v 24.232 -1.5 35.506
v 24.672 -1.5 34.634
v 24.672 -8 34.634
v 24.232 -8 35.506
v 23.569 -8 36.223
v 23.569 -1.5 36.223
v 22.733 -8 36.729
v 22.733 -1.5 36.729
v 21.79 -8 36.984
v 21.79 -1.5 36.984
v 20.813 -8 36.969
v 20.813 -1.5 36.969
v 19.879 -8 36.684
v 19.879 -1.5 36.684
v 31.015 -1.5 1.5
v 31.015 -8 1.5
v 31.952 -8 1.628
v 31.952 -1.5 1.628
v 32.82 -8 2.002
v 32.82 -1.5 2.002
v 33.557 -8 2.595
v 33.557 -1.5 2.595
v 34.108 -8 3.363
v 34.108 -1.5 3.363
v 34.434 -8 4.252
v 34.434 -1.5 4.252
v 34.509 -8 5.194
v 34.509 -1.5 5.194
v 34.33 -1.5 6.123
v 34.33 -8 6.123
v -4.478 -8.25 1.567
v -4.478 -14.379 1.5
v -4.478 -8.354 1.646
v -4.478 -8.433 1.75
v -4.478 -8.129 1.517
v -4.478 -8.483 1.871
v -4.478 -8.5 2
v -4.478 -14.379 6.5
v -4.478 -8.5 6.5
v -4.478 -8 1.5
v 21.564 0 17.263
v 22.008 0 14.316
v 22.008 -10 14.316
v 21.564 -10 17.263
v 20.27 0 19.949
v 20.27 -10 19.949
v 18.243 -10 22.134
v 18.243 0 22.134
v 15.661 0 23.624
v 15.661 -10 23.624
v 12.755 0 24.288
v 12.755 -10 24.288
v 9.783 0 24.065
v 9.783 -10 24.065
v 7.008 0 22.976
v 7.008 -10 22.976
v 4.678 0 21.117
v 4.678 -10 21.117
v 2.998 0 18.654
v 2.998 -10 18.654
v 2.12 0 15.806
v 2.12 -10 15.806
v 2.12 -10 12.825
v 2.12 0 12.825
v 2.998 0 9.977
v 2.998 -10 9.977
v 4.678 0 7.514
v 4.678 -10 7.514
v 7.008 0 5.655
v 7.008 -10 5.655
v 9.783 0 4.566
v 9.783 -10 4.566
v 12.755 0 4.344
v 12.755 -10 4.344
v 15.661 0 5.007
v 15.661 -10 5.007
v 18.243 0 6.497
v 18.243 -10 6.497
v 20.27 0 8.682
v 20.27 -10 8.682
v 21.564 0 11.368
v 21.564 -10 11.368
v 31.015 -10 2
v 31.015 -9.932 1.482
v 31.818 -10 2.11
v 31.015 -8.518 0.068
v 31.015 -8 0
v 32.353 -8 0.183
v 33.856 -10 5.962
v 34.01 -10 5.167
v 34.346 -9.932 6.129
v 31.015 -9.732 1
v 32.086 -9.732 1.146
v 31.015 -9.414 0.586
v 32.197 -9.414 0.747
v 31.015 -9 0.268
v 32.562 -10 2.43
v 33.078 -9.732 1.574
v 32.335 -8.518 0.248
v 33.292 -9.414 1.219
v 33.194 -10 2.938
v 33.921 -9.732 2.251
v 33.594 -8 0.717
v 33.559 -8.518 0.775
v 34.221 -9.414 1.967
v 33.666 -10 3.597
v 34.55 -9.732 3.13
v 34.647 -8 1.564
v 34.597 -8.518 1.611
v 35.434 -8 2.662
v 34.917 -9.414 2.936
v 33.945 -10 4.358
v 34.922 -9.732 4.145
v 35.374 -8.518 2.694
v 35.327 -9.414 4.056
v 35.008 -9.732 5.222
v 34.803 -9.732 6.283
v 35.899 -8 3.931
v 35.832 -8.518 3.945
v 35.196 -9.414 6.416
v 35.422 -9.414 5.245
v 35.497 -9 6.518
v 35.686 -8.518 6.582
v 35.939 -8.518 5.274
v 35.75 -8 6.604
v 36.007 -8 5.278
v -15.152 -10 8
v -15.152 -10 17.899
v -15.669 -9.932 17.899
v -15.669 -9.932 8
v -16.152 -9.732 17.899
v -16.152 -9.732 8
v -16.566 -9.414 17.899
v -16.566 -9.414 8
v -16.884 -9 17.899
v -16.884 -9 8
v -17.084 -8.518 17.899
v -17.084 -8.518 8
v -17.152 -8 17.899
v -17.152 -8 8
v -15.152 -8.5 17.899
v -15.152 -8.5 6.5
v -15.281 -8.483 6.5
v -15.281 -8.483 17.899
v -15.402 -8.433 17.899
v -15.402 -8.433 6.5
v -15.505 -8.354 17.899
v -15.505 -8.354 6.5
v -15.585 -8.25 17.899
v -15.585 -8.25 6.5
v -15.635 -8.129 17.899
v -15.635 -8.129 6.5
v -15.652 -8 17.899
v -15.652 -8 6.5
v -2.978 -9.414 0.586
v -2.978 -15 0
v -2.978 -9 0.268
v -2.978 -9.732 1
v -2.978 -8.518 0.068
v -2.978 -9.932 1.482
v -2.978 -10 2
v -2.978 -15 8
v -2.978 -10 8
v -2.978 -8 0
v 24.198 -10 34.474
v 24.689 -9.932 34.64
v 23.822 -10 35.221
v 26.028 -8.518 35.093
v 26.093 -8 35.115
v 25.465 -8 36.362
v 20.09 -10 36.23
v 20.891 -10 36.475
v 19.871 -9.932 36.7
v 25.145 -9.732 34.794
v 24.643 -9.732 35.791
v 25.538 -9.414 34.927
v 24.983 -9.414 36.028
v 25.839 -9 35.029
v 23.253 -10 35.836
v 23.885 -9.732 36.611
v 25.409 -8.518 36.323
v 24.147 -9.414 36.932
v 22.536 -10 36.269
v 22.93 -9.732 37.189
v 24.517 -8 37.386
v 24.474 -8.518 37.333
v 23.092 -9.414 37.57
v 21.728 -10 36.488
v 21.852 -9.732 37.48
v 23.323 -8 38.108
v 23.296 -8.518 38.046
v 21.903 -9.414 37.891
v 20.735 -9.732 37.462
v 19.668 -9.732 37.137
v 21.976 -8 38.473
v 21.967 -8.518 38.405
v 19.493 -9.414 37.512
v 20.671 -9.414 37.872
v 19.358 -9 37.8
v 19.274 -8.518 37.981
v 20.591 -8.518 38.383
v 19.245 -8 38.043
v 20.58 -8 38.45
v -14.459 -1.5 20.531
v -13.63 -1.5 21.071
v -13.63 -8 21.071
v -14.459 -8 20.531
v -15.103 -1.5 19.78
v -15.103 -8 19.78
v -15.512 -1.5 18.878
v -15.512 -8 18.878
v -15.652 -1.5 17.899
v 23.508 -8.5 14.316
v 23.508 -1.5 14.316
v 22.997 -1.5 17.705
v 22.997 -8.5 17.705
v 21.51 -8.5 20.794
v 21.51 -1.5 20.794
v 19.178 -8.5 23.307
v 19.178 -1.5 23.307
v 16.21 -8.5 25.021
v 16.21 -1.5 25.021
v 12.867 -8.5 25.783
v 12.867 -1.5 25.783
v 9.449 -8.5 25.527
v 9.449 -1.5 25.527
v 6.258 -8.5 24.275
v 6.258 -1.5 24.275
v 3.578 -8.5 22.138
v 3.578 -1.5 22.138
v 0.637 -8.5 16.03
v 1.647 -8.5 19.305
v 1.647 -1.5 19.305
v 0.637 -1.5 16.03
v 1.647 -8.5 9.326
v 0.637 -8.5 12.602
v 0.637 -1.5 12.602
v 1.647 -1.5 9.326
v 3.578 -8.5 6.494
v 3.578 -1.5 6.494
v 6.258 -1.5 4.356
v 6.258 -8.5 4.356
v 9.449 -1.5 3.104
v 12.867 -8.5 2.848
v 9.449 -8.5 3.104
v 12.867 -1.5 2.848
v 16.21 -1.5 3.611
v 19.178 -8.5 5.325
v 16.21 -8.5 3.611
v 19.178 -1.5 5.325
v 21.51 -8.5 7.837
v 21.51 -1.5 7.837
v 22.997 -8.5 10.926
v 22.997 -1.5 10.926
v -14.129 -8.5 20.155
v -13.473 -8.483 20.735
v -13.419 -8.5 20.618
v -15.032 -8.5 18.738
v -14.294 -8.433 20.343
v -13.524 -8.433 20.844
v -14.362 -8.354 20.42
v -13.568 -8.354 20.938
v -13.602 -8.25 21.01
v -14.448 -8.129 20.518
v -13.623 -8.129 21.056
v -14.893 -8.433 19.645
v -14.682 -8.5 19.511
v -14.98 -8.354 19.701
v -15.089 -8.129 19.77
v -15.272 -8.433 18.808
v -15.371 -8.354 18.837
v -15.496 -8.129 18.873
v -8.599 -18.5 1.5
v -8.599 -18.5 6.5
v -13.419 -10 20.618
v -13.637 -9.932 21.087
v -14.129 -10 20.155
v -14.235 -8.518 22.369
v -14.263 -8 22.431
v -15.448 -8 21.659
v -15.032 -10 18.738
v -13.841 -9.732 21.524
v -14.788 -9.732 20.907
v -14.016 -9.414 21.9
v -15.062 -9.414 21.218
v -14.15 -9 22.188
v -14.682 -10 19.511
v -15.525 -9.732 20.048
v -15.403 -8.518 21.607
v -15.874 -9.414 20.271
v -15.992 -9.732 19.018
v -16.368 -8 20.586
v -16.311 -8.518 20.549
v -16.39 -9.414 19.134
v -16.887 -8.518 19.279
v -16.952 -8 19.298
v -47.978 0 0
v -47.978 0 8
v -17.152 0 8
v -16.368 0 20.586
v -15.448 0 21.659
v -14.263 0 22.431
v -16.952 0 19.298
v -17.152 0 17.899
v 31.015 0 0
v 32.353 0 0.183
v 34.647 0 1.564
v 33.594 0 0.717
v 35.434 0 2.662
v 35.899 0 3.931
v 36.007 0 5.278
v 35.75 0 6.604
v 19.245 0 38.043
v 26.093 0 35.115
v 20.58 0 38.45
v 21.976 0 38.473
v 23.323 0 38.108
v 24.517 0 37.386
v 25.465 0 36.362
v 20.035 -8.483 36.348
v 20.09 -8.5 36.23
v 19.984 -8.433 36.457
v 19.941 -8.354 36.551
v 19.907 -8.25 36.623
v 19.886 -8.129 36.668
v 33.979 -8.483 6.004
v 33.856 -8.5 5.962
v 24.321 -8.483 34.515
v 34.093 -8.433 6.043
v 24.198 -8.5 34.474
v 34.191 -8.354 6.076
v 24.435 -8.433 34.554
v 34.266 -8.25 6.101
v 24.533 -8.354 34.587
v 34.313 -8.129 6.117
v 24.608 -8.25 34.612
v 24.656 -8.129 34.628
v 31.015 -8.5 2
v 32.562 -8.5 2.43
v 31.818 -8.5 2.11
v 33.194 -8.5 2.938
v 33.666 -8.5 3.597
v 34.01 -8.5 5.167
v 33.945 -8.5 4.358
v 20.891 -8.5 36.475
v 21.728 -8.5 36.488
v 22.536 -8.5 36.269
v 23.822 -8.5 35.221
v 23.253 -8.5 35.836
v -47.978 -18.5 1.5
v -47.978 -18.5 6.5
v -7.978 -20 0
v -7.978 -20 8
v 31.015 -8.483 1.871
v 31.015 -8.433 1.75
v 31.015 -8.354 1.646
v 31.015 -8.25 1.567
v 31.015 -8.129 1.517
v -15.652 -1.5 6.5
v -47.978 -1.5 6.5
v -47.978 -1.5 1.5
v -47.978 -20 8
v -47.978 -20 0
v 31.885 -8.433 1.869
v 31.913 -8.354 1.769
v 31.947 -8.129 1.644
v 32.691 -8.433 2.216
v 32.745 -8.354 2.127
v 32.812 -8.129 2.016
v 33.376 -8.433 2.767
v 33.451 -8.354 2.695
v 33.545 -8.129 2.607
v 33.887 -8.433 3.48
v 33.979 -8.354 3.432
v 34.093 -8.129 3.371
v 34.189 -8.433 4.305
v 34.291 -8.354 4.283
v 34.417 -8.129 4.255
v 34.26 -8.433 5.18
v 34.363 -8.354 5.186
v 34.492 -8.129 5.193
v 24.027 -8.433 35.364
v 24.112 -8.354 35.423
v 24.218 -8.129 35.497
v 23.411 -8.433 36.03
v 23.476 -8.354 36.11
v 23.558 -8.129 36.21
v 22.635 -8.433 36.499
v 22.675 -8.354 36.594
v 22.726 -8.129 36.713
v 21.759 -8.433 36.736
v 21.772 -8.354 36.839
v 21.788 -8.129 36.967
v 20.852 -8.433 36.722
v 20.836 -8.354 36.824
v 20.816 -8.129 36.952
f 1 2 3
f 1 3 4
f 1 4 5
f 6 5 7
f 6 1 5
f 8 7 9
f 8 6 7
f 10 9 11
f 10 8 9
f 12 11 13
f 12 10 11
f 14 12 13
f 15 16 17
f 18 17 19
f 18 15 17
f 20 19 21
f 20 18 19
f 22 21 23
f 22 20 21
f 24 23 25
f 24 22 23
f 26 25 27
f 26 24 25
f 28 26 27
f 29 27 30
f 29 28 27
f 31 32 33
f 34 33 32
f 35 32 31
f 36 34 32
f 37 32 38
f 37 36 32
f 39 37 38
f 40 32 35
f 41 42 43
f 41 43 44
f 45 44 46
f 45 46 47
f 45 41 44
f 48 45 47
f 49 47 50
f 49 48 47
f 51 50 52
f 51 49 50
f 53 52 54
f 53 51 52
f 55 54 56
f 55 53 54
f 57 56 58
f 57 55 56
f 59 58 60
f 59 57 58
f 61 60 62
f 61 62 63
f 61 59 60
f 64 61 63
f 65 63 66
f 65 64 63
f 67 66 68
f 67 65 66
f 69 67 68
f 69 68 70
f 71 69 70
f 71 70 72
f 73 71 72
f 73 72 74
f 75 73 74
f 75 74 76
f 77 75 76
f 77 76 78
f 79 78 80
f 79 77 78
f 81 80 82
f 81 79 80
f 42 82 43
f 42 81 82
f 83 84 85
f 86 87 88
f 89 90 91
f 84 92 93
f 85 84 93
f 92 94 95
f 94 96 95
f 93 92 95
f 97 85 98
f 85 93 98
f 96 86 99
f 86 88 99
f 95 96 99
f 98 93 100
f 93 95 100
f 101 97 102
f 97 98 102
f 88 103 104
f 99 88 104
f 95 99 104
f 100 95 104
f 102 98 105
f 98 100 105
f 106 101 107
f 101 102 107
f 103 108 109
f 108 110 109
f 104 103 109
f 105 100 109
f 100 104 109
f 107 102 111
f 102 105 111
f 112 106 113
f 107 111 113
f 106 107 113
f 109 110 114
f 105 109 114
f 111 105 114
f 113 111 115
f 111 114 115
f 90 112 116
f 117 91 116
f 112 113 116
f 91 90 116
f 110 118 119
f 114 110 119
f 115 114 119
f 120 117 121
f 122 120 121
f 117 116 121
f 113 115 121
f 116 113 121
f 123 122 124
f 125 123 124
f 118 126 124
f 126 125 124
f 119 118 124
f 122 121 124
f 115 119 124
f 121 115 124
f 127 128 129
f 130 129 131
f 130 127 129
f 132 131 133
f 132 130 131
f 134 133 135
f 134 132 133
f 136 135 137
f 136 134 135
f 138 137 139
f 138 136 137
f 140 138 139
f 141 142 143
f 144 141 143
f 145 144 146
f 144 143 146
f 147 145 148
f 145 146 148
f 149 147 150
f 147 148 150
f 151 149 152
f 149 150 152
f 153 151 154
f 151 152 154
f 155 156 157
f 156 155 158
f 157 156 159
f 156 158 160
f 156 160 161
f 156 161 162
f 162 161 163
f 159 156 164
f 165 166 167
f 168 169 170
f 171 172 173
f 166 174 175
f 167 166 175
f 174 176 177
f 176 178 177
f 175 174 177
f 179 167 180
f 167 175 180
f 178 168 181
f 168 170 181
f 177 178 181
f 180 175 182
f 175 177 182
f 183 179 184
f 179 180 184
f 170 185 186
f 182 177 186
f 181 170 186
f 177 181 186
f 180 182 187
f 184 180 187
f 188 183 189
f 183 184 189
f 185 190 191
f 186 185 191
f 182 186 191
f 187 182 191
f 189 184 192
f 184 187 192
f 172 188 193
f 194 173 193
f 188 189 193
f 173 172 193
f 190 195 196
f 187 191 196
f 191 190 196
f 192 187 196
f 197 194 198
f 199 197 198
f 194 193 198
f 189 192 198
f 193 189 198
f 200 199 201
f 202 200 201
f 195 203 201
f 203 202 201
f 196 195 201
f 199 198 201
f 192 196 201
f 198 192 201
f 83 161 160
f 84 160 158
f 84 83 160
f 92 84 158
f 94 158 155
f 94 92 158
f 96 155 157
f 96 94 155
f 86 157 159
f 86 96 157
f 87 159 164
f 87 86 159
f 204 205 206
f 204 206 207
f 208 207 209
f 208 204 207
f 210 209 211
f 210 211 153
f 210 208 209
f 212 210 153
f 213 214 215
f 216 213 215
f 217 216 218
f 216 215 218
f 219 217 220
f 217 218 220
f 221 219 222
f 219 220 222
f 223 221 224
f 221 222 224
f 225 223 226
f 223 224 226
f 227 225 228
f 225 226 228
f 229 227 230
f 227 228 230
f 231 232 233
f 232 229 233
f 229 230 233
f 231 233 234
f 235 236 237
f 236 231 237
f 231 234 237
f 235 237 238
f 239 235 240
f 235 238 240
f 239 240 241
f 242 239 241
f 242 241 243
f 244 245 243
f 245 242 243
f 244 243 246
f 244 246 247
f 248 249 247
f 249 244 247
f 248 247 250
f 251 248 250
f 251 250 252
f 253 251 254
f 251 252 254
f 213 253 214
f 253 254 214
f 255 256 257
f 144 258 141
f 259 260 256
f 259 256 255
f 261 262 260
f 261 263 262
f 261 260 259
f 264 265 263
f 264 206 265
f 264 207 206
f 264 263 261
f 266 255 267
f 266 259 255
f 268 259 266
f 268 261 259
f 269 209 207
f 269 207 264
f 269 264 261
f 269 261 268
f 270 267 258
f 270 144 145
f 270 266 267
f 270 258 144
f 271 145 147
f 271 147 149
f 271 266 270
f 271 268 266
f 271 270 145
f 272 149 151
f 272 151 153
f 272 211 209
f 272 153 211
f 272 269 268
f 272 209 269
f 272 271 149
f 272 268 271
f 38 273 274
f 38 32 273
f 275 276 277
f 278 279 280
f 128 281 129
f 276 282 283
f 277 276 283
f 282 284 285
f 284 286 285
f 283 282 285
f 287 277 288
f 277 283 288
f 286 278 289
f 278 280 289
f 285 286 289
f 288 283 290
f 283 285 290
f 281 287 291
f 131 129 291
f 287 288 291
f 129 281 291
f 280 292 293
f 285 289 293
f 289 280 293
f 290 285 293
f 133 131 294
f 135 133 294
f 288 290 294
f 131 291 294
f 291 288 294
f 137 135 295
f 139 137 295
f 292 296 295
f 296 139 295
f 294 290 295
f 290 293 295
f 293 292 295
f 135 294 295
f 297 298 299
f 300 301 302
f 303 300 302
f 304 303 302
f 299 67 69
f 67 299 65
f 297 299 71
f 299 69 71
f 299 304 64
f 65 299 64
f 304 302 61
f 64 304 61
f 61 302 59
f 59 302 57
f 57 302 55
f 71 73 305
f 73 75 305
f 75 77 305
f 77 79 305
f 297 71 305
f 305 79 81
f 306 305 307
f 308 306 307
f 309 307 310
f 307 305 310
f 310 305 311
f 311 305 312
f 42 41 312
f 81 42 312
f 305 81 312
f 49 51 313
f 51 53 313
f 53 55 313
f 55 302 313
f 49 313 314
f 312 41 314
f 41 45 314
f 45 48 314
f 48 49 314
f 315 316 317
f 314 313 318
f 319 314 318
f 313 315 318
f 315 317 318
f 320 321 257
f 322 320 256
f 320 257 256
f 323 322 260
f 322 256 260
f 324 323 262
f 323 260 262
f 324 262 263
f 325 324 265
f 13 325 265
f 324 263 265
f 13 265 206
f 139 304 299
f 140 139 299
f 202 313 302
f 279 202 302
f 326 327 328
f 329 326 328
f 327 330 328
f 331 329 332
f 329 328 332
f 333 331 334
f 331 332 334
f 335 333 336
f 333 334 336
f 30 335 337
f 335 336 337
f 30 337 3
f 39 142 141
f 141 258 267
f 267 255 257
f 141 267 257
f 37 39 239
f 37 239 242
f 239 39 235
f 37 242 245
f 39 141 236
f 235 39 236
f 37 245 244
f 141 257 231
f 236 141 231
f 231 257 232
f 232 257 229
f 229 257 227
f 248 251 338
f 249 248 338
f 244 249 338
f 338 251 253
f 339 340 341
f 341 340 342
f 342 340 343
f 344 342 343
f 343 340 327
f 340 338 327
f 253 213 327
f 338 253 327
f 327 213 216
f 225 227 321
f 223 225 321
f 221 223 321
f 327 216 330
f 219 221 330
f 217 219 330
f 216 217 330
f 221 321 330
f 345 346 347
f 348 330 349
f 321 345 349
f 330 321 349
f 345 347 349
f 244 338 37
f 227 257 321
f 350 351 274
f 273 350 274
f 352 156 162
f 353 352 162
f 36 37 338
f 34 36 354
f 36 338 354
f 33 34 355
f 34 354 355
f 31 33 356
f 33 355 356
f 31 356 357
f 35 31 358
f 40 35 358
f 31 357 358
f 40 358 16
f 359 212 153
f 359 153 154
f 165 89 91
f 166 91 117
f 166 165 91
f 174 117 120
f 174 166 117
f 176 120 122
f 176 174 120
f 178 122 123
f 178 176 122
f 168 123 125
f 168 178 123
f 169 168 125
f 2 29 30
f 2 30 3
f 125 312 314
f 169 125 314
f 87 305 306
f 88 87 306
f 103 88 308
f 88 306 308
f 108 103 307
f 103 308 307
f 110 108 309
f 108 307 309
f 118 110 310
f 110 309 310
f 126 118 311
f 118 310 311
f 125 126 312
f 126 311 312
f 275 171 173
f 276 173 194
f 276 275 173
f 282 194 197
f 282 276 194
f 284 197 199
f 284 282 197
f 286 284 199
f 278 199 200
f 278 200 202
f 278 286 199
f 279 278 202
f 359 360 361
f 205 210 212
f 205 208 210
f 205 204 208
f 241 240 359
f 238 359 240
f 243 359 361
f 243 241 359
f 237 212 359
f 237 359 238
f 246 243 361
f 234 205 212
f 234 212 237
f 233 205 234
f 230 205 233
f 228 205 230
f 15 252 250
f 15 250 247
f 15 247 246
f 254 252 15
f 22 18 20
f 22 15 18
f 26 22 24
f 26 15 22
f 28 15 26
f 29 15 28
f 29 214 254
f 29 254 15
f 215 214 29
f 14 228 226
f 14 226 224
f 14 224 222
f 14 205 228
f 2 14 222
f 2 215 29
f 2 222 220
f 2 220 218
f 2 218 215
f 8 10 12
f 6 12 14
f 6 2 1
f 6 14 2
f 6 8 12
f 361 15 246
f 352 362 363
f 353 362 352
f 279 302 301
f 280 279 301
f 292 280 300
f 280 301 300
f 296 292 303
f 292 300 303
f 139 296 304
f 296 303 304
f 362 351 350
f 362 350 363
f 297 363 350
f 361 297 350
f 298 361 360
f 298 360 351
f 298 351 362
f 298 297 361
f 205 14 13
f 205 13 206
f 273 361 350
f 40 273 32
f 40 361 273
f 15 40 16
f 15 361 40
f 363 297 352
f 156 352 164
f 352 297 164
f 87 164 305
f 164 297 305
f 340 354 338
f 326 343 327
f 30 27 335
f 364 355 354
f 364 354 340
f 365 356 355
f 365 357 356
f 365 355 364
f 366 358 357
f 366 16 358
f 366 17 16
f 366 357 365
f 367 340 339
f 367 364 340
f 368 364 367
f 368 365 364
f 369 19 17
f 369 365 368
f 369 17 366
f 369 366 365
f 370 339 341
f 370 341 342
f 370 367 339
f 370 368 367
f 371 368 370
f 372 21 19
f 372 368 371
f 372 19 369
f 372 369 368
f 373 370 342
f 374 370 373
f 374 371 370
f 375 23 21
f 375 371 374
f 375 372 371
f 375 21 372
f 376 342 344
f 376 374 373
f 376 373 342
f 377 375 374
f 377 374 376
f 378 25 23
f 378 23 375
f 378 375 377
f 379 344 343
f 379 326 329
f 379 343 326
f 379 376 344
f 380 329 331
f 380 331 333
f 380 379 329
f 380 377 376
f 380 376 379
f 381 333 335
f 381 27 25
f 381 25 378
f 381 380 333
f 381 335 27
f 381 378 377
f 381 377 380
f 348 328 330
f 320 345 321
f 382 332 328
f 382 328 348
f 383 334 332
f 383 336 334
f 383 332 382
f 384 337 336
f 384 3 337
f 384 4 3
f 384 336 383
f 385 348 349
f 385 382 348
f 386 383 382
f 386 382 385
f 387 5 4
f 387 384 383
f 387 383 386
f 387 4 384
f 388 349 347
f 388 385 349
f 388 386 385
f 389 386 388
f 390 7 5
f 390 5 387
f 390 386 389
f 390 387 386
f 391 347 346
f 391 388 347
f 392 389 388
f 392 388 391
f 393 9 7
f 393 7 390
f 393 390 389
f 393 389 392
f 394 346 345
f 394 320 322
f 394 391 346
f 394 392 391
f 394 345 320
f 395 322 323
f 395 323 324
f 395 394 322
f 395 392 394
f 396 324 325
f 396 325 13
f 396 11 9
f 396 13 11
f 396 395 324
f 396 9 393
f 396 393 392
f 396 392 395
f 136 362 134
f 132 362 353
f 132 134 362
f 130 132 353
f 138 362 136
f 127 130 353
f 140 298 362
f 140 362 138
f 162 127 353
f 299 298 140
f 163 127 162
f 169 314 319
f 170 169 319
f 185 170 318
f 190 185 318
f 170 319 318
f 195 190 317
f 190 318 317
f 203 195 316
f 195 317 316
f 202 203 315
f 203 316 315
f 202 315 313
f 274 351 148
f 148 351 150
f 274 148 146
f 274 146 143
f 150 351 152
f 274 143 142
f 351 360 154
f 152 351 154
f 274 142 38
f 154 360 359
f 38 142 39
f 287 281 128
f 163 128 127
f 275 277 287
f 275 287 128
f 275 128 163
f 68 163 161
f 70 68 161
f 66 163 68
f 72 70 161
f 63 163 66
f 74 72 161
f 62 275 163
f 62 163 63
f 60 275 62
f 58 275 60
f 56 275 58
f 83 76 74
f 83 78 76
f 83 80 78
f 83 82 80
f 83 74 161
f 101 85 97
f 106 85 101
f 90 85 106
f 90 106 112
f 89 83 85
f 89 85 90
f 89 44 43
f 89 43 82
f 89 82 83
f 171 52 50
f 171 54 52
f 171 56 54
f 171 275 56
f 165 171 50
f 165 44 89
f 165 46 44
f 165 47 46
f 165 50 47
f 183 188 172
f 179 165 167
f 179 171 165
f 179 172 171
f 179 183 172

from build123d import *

# Parameters (mm, degrees)
F0_R     = 10
F1_DEPTH = 10
F2_W     = 45
F2_H     = 8
F3_DEPTH = 20
F4_SIZE  = 5
F5_R     = 2
F6_T     = -1.5


with BuildPart() as f1:
    # F0 (on Front) → F1 (new body)
    with BuildSketch(Plane.XZ):
        with BuildLine():
            Line((-17.1517986995, 17.8985519321), (-17.1517986995, 5))
            ThreePointArc((-17.1517986995, 5), (-15.6873326054, 1.4644660941), (-12.1517986995, 0))
            Line((-12.1517986995, 0), (31.0146413554, 0))
            ThreePointArc((31.0146413554, 0), (35.0779397644, 2.0863071474), (35.7503227684, 6.6041575842))
            Line((35.7503227684, 6.6041575842), (26.0925432946, 35.115176199))
            ThreePointArc((26.0925432946, 35.115176199), (23.3227556246, 38.1083288927), (19.245201431, 38.0432244951))
            Line((19.245201431, 38.0432244951), (-14.2634591502, 22.4307578124))
            ThreePointArc((-14.2634591502, 22.4307578124), (-16.368331769, 20.585715655), (-17.1517986995, 17.8985519321))
        make_face()
        with Locations((12.0080858469, 14.3155753613)):
            Circle(F0_R, mode=Mode.SUBTRACT)
    extrude(amount=F1_DEPTH)

    # F2 (on Front) → F3 (join)
    with BuildSketch(Plane.XZ):
        with Locations((-25.4780513432, 4)):
            Rectangle(F2_W, F2_H)
    extrude(amount=F3_DEPTH)

    # F4
    f4_edges = [f1.edges().sort_by_distance(p)[0] for p in [
        (-2.978051, -20, 4),
    ]]
    chamfer(f4_edges, length=F4_SIZE)

    # F5
    f5_edges = [f1.edges().sort_by_distance(p)[0] for p in [
        (-17.151799, -10, 12.949276),
        (-16.368332, -10, 20.585716),
        (2.490871, -10, 30.236991),
        (23.322756, -10, 38.108329),
        (30.921433, -10, 20.859667),
        (35.07794, -10, 2.086307),
        (14.018295, -10, 0),
    ]]
    fillet(f5_edges, radius=F5_R)

    # F6
    f6_openings = [f1.faces().sort_by_distance(p)[0] for p in [
        (-47.978051, -10, 4),
    ]]
    offset(amount=F6_T, openings=f6_openings, kind=Kind.INTERSECTION)


solid = f1.part
